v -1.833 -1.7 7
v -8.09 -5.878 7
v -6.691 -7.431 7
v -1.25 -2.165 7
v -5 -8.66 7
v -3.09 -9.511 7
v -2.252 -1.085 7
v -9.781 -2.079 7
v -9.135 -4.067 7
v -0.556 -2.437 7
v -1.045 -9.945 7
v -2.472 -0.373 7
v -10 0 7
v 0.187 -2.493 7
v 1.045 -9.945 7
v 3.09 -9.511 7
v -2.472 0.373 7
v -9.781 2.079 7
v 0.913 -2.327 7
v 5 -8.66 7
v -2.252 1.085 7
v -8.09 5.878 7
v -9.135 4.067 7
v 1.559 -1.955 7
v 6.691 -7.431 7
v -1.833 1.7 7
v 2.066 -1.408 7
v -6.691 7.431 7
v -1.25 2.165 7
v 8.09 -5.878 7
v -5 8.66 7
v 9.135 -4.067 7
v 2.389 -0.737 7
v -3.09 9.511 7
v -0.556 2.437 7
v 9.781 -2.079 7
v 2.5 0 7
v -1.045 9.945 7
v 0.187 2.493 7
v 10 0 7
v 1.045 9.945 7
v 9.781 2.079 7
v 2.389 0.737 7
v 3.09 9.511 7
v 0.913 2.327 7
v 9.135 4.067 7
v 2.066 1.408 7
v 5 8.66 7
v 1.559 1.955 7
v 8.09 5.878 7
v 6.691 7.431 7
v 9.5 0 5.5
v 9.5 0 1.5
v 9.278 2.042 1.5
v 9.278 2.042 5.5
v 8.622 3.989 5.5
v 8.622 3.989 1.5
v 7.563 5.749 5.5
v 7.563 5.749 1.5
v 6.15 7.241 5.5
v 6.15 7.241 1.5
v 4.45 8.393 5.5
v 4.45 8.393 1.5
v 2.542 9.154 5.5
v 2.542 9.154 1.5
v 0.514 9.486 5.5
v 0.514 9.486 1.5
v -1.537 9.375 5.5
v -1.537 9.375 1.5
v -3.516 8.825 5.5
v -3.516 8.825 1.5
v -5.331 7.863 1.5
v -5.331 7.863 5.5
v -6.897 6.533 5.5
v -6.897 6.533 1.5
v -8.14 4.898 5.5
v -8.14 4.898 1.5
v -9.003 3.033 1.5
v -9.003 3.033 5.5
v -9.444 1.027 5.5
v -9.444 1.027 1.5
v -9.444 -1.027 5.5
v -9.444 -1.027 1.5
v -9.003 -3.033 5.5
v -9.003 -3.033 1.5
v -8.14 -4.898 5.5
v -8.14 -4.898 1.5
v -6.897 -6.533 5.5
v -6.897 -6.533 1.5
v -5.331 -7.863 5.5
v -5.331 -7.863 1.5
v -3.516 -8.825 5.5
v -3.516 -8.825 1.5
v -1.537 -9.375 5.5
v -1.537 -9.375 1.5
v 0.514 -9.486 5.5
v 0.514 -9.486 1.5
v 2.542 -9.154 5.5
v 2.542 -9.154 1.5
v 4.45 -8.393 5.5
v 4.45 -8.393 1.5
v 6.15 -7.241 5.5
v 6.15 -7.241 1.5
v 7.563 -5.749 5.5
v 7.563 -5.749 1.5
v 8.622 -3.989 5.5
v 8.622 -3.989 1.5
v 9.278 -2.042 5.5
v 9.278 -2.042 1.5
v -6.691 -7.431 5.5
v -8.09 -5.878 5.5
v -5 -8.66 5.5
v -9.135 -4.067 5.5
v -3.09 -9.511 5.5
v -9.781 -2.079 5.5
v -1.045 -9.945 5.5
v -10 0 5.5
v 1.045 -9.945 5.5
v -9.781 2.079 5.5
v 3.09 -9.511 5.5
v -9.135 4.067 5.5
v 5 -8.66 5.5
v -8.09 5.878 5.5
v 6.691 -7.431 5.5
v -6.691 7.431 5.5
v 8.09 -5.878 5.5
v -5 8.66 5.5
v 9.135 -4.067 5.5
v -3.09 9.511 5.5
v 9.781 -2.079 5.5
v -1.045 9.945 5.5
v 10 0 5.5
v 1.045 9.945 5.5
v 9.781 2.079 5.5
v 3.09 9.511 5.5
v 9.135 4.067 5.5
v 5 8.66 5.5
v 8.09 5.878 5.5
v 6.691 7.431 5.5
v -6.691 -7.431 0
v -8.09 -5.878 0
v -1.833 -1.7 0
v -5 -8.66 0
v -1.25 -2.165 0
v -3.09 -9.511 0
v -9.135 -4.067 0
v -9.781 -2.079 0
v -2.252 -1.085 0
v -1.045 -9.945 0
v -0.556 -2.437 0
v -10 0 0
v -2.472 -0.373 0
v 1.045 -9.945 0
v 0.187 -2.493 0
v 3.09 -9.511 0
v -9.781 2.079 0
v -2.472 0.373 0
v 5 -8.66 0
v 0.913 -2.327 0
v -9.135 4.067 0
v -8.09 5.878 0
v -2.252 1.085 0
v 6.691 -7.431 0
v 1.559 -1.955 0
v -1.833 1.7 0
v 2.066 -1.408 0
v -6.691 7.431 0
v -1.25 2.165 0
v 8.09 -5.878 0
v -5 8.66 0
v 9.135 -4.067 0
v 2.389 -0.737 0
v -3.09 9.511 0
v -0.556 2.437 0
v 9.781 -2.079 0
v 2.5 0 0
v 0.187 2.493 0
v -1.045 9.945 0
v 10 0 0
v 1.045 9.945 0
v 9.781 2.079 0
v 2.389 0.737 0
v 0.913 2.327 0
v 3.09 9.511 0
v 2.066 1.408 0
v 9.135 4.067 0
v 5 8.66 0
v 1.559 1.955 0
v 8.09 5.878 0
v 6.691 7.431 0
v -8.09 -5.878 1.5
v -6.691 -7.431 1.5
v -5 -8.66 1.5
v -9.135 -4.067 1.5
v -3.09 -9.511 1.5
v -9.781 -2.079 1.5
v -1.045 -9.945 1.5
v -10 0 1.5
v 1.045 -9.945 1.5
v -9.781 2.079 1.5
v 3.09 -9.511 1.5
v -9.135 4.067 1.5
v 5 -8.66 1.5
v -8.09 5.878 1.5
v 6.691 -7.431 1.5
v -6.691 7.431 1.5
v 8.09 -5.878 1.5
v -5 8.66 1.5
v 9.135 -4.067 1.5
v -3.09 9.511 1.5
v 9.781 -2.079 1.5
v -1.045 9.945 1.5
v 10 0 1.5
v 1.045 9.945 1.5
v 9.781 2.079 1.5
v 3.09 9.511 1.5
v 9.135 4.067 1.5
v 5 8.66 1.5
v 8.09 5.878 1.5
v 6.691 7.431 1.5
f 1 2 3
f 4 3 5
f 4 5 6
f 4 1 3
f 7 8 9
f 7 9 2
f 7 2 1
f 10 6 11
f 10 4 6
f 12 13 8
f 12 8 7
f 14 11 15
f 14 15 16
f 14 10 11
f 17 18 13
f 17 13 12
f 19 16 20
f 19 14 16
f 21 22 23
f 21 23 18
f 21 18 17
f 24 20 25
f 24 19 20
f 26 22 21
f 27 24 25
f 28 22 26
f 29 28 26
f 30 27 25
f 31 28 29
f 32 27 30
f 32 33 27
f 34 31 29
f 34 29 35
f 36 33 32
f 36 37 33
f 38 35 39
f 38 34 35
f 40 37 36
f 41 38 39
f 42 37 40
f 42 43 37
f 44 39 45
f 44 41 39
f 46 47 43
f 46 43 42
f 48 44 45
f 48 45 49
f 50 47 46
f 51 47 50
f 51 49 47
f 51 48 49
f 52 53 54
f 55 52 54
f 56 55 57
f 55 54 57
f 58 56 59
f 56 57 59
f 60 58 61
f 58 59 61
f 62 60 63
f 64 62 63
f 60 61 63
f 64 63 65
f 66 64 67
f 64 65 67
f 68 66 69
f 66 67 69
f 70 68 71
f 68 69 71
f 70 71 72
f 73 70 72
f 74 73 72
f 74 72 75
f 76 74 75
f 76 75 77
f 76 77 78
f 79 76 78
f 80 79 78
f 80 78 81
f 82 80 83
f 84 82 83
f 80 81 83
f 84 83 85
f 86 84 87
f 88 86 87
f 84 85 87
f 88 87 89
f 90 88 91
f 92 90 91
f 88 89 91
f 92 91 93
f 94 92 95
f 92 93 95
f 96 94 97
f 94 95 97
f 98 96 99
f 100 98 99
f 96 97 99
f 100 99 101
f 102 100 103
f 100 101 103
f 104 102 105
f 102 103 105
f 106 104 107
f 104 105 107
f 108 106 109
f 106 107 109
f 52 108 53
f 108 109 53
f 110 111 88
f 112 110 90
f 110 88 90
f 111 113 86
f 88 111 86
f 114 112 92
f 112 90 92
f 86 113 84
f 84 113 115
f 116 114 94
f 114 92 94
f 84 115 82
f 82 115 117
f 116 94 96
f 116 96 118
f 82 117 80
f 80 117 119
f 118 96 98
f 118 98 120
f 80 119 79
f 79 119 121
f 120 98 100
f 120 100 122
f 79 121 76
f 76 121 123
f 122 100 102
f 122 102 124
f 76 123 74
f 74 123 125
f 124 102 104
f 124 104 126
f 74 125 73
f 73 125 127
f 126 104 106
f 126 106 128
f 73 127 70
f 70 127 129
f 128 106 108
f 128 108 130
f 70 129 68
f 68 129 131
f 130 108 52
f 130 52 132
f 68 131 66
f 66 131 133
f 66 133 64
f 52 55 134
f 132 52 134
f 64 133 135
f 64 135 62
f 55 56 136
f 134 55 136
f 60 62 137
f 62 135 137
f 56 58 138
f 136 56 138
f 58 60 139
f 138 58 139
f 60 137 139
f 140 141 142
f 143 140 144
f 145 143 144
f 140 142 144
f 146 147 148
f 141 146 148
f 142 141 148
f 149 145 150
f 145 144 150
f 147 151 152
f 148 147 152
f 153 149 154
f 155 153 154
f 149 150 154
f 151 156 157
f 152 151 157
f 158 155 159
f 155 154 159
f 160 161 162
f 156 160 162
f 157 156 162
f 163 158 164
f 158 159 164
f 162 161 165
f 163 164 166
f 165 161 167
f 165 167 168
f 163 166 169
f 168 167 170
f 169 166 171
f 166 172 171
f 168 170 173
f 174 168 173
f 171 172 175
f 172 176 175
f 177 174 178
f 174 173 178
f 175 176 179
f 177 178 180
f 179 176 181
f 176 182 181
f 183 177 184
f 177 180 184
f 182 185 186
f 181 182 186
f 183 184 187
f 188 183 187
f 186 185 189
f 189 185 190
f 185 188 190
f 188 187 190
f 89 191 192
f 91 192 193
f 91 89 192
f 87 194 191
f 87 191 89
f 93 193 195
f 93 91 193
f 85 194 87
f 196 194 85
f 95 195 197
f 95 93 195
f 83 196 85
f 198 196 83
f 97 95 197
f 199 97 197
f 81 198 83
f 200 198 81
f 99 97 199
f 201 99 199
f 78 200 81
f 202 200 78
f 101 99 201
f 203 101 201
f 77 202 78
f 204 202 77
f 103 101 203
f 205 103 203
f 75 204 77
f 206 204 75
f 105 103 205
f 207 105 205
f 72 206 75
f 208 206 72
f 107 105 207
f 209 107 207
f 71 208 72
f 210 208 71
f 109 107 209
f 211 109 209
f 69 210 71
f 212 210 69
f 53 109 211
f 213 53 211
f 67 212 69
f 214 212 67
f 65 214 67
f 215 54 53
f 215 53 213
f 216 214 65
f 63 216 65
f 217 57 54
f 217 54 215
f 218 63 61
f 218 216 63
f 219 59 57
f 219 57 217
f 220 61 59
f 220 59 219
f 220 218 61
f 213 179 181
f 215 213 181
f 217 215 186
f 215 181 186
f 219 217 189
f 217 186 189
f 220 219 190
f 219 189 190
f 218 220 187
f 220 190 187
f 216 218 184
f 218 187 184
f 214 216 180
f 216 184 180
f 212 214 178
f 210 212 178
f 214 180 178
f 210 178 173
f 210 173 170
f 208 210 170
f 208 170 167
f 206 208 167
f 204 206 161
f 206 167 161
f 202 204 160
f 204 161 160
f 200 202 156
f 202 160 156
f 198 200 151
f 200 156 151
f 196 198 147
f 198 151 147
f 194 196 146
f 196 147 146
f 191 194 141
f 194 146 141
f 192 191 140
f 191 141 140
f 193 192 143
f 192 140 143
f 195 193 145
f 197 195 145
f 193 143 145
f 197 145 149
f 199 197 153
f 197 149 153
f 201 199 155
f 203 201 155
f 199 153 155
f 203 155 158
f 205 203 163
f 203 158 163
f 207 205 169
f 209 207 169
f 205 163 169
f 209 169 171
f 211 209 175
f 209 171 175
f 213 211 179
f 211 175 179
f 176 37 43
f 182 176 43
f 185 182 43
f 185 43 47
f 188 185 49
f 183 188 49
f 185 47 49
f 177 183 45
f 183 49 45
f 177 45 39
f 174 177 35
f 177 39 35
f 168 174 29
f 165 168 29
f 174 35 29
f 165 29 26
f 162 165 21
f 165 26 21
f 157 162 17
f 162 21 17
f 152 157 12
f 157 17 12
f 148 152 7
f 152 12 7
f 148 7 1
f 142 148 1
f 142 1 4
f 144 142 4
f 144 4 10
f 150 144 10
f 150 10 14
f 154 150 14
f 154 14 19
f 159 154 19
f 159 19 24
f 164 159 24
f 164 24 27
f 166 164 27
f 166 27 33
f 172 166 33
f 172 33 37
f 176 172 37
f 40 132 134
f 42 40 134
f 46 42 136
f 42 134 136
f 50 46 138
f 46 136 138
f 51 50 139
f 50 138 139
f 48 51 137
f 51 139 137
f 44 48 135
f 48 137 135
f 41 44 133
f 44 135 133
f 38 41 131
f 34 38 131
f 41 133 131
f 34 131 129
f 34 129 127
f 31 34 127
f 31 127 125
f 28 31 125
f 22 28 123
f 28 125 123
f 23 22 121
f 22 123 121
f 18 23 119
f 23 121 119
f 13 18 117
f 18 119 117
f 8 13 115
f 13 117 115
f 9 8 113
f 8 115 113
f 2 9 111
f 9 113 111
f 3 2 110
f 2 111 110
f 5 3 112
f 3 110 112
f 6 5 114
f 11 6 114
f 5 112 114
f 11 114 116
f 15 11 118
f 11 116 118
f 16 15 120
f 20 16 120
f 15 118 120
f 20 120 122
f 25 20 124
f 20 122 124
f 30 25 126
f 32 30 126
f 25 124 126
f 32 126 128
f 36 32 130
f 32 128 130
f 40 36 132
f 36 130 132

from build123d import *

# Parameters (mm, degrees)
SKETCH_R     = 10
PAD_DEPTH    = 1.5
SKETCH001_R  = 9.5
PAD001_DEPTH = 4
SKETCH002_R  = 10
PAD002_DEPTH = 1.5
SKETCH003_R  = 2.5
POCKET_DEPTH = 7.001


with BuildPart() as part:
    # Sketch → Pad (new body)
    with BuildSketch(Plane.XY):
        Circle(SKETCH_R)
    extrude(amount=PAD_DEPTH)

    # Sketch001 (on Face3 of Pad) → Pad001 (join)
    with BuildSketch(Plane.XY.offset(1.5)):
        Circle(SKETCH001_R)
    extrude(amount=PAD001_DEPTH)

    # Sketch002 (on Face5 of Pad001) → Pad002 (join)
    with BuildSketch(Plane.XY.offset(5.5)):
        Circle(SKETCH002_R)
    extrude(amount=PAD002_DEPTH)

    # Sketch003 (on Face3 of Pad002) → Pocket (cut, through all)
    with BuildSketch(Plane.XY.offset(7)):
        Circle(SKETCH003_R)
    extrude(amount=-POCKET_DEPTH, mode=Mode.SUBTRACT)


solid = part.part
